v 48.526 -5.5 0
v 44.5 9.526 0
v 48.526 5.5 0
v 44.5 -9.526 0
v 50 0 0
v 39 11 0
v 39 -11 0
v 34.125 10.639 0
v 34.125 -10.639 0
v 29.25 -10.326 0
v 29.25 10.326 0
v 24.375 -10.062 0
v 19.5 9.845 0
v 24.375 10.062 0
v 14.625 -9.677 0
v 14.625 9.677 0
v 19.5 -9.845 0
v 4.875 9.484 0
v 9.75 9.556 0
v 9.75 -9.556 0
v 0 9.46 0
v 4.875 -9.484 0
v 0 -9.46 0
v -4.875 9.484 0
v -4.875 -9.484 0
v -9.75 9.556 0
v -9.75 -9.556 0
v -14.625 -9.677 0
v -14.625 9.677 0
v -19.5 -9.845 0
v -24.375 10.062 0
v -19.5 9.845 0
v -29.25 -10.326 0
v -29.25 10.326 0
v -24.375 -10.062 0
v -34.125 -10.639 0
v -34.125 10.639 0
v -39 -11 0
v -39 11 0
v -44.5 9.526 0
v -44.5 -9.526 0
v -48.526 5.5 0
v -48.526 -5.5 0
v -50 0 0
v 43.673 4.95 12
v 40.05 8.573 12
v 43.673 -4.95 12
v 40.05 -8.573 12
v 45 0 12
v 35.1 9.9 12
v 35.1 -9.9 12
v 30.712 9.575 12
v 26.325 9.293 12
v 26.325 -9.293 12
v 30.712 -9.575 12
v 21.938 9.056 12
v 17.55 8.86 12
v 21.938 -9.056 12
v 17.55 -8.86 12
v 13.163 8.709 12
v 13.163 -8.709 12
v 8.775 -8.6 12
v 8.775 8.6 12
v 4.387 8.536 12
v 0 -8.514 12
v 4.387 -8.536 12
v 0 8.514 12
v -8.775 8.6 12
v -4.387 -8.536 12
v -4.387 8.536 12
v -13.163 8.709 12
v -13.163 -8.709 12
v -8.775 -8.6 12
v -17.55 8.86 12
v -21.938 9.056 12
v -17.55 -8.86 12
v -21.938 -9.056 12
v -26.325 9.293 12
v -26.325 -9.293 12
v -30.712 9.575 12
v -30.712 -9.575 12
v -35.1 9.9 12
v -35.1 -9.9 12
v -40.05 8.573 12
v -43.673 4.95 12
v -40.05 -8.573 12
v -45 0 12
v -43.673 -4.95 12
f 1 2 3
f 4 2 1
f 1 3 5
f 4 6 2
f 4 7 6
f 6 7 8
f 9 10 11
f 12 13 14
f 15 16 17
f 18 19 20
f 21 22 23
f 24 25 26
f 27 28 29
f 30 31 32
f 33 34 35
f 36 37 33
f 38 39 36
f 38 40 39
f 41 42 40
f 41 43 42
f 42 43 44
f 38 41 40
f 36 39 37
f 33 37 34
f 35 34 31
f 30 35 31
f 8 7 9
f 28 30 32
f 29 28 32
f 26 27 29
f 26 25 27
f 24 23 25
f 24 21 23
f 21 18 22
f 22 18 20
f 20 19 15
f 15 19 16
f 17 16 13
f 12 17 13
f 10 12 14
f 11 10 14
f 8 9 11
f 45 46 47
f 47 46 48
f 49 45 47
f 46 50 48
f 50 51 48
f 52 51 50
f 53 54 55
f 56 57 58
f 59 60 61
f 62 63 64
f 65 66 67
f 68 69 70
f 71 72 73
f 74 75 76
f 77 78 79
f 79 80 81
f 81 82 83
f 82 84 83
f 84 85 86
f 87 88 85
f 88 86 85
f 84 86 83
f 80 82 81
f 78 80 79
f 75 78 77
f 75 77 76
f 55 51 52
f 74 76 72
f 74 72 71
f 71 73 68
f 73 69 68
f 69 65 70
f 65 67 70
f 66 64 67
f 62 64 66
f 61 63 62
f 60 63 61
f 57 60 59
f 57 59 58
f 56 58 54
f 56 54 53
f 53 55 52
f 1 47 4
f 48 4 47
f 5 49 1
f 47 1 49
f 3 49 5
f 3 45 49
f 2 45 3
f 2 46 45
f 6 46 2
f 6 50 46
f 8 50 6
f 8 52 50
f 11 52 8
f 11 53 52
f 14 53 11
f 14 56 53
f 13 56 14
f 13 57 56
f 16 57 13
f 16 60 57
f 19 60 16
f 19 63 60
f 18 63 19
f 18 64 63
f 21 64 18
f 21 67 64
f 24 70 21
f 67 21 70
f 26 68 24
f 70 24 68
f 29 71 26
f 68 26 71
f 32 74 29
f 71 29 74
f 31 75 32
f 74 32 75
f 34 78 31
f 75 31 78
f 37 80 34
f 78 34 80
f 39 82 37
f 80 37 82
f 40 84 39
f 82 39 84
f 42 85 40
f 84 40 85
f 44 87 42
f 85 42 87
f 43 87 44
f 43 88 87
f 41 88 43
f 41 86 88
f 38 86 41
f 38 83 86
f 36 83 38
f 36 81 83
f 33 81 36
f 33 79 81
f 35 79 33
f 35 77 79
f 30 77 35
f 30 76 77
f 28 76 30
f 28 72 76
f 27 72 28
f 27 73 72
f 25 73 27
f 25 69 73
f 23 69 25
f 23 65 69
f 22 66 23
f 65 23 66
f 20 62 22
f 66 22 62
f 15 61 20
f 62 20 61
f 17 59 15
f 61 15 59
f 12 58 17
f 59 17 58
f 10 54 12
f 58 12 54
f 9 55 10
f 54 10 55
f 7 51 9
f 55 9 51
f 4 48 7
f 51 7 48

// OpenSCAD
$fn = 32;

// ----------------------------------------------------------------------
// Handle: 100 x 22 mm grip, 12 mm thick
// ----------------------------------------------------------------------

// --- parameters (mm) ---
length = 100;             // grip length
width = 22;               // grip width
thickness = 12;           // grip thickness
waist = 0.86;             // width factor at the middle
draft = 0.9;              // top face scale of the extrusion

/* ergonomic grip outline, closed spline-like polygon in the XY plane */
grip = [[-39, 11], [-34.125, 10.639], [-29.25, 10.326], [-24.375, 10.062], [-19.5, 9.845], [-14.625, 9.677], [-9.75, 9.556], [-4.875, 9.484], [0, 9.46], [4.875, 9.484], [9.75, 9.556], [14.625, 9.677], [19.5, 9.845], [24.375, 10.062], [29.25, 10.326], [34.125, 10.639], [39, 11], [44.5, 9.526], [48.526, 5.5], [50, 0], [48.526, -5.5], [44.5, -9.526], [39, -11], [39, -11], [34.125, -10.639], [29.25, -10.326], [24.375, -10.062], [19.5, -9.845], [14.625, -9.677], [9.75, -9.556], [4.875, -9.484], [0, -9.46], [-4.875, -9.484], [-9.75, -9.556], [-14.625, -9.677], [-19.5, -9.845], [-24.375, -10.062], [-29.25, -10.326], [-34.125, -10.639], [-39, -11], [-44.5, -9.526], [-48.526, -5.5], [-50, 0], [-48.526, 5.5], [-44.5, 9.526], [-39, 11]];

module grip_body() {
  linear_extrude(height = thickness, scale = draft) polygon(grip);
}

difference() {
  union() {
    grip_body();
  }
}
